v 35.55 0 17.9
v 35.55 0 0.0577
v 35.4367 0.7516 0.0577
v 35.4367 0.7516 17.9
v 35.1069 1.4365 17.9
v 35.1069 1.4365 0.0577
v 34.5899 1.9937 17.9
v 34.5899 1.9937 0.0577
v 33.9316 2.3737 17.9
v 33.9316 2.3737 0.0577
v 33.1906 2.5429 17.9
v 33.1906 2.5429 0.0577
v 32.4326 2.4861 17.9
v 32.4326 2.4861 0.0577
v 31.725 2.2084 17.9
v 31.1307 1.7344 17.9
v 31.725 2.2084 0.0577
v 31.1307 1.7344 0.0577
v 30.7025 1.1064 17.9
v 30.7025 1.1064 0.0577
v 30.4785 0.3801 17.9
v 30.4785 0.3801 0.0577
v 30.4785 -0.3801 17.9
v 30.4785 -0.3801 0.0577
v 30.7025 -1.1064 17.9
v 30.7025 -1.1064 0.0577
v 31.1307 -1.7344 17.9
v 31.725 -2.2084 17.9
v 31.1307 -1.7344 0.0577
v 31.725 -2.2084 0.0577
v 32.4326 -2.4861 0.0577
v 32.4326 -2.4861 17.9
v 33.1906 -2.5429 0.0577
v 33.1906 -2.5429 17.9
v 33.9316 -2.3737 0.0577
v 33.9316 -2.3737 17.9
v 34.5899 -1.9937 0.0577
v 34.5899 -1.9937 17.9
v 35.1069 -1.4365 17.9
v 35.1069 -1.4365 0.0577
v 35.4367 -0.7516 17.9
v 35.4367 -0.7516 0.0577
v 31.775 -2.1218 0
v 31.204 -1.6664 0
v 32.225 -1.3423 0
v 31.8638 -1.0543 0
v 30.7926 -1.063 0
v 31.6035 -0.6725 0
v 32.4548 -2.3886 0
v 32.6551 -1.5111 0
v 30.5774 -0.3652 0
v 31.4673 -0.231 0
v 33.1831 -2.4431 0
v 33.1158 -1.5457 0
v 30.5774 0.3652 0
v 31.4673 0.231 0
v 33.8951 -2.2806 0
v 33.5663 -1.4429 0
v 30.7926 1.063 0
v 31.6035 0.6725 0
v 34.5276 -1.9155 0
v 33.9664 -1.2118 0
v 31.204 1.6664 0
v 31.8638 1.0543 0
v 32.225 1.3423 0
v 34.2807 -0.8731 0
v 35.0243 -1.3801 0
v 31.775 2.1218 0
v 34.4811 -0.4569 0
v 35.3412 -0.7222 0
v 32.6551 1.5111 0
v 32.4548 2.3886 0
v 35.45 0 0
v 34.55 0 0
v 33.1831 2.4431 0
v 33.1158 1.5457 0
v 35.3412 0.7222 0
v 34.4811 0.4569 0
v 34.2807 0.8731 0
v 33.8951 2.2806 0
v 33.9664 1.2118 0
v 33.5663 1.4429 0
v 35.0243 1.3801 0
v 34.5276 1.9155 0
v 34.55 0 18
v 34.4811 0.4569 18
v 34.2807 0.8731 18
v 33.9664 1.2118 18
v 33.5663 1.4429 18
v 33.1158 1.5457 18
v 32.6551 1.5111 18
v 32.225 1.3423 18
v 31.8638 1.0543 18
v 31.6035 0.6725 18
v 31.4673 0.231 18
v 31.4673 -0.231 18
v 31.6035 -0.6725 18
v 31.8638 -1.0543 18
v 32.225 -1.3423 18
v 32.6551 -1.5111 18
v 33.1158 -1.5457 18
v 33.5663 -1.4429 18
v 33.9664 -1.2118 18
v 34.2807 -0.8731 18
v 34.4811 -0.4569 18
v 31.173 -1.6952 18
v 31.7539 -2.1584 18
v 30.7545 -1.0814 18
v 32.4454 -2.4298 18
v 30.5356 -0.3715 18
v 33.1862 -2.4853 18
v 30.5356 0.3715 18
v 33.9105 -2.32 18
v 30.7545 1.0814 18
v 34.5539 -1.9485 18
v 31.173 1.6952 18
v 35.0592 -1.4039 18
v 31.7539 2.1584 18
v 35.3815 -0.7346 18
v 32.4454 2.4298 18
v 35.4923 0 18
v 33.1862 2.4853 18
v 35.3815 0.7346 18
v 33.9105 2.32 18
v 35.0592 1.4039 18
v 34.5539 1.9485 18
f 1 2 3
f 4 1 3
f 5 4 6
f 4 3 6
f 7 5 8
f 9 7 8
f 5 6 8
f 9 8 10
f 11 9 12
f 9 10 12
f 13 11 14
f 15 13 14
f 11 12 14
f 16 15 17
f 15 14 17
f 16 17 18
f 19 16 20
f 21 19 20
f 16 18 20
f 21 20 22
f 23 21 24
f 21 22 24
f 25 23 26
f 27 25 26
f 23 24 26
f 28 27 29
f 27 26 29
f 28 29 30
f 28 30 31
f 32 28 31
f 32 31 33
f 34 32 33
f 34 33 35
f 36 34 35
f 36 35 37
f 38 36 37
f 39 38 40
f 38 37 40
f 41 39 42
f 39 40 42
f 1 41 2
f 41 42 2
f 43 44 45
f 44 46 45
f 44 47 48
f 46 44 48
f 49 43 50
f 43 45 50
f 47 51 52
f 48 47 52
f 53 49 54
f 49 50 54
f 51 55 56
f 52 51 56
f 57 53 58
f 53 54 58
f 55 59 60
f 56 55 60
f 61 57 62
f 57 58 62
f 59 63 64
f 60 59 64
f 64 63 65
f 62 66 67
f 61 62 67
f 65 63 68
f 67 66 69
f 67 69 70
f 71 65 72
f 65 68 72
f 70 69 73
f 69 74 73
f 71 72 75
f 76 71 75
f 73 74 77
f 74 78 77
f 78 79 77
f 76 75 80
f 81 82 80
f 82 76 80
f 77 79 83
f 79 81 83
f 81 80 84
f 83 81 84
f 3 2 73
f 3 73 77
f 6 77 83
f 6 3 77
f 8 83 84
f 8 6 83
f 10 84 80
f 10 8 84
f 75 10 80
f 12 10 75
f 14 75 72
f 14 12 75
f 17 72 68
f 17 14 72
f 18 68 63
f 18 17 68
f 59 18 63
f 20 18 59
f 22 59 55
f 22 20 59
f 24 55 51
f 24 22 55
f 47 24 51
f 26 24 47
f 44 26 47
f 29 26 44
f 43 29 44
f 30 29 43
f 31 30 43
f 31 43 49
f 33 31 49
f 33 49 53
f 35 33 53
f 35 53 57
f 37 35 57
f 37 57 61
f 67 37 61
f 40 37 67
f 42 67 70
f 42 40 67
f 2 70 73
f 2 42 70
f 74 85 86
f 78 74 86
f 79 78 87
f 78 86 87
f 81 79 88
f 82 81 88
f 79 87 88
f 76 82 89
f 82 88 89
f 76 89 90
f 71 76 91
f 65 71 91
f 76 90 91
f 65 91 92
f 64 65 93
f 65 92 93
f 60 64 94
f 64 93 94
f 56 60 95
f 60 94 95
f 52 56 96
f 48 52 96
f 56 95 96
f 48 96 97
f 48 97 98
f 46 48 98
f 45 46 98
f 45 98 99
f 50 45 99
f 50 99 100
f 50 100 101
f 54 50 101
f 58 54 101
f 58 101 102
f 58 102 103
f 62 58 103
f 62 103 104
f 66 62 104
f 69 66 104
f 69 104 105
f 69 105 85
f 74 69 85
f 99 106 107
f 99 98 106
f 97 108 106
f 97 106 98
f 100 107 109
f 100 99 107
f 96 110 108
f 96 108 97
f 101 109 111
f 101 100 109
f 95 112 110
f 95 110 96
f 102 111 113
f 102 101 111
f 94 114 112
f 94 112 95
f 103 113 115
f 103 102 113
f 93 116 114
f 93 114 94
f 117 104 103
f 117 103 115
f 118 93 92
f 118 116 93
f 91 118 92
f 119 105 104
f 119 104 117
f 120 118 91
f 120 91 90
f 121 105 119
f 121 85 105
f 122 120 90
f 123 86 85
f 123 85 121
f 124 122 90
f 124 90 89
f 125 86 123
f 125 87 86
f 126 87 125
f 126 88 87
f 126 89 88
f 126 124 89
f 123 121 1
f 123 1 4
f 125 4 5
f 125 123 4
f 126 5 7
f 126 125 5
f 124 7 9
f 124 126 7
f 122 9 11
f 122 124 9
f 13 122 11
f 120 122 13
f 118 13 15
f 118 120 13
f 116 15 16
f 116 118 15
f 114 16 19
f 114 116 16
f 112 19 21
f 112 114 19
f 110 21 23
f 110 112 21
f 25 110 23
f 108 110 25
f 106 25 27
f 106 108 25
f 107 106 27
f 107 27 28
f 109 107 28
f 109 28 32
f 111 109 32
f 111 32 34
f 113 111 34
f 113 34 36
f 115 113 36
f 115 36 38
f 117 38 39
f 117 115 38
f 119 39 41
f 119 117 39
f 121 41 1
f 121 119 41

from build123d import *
from OCP.BRepFilletAPI import BRepFilletAPI_MakeChamfer

# Parameters (mm, degrees)
SKETCH1_R           = 2.55
BOSS_EXTRUDE1_DEPTH = 18
CUT_EXTRUDE1_REACH  = 41.929
SKETCH3_R           = 1.55
CHAMFER1_SIZE       = 0.1
CHAMFER1_SIZE2      = 0.057735027


with BuildPart() as part:
    # Sketch1 → Boss-Extrude1 (new body)
    with BuildSketch(Plane.XY):
        with Locations((33, 0)):
            Circle(SKETCH1_R)
    extrude(amount=BOSS_EXTRUDE1_DEPTH)

    # Sketch3 → Cut-Extrude1 (cut, up to next)
    with BuildSketch(Plane.XY.offset(18), mode=Mode.PRIVATE) as cut_extrude1_sk1:
        with Locations((33, 0)):
            Circle(SKETCH3_R)
    cut_extrude1_tool1 = extrude(cut_extrude1_sk1.sketch, amount=-CUT_EXTRUDE1_REACH, mode=Mode.PRIVATE) & part.part
    add(cut_extrude1_tool1.solids().sort_by_distance((33, 0, 18))[0], mode=Mode.SUBTRACT)

    # Chamfer1: one chamfer whose edges measure the first distance from different faces: ONE call of the kernel's chamfer builder (chamfer() names one face for all edges)
    chamfer1_edges_1 = [part.edges().sort_by_distance(p)[0] for p in [
        (30.45, 0, 0),
    ]]
    chamfer1_side_1 = [part.faces().sort_by_distance(p)[0] for p in [
        (30.522124892, 0, 0),
    ]]
    chamfer1_edges_2 = [part.edges().sort_by_distance(p)[0] for p in [
        (30.45, 0, 18),
    ]]
    chamfer1_side_2 = [part.faces().sort_by_distance(p)[0] for p in [
        (30.45, 0, 9),
    ]]
    chamfer1 = BRepFilletAPI_MakeChamfer(part.part.solid().wrapped)
    for e in chamfer1_edges_1:
        chamfer1.Add(CHAMFER1_SIZE, CHAMFER1_SIZE2, e.wrapped, chamfer1_side_1[0].wrapped)  # the first distance lies on this face
    for e in chamfer1_edges_2:
        chamfer1.Add(CHAMFER1_SIZE, CHAMFER1_SIZE2, e.wrapped, chamfer1_side_2[0].wrapped)  # the first distance lies on this face
    add(Compound.cast(chamfer1.Shape()), mode=Mode.REPLACE)


solid = part.part
